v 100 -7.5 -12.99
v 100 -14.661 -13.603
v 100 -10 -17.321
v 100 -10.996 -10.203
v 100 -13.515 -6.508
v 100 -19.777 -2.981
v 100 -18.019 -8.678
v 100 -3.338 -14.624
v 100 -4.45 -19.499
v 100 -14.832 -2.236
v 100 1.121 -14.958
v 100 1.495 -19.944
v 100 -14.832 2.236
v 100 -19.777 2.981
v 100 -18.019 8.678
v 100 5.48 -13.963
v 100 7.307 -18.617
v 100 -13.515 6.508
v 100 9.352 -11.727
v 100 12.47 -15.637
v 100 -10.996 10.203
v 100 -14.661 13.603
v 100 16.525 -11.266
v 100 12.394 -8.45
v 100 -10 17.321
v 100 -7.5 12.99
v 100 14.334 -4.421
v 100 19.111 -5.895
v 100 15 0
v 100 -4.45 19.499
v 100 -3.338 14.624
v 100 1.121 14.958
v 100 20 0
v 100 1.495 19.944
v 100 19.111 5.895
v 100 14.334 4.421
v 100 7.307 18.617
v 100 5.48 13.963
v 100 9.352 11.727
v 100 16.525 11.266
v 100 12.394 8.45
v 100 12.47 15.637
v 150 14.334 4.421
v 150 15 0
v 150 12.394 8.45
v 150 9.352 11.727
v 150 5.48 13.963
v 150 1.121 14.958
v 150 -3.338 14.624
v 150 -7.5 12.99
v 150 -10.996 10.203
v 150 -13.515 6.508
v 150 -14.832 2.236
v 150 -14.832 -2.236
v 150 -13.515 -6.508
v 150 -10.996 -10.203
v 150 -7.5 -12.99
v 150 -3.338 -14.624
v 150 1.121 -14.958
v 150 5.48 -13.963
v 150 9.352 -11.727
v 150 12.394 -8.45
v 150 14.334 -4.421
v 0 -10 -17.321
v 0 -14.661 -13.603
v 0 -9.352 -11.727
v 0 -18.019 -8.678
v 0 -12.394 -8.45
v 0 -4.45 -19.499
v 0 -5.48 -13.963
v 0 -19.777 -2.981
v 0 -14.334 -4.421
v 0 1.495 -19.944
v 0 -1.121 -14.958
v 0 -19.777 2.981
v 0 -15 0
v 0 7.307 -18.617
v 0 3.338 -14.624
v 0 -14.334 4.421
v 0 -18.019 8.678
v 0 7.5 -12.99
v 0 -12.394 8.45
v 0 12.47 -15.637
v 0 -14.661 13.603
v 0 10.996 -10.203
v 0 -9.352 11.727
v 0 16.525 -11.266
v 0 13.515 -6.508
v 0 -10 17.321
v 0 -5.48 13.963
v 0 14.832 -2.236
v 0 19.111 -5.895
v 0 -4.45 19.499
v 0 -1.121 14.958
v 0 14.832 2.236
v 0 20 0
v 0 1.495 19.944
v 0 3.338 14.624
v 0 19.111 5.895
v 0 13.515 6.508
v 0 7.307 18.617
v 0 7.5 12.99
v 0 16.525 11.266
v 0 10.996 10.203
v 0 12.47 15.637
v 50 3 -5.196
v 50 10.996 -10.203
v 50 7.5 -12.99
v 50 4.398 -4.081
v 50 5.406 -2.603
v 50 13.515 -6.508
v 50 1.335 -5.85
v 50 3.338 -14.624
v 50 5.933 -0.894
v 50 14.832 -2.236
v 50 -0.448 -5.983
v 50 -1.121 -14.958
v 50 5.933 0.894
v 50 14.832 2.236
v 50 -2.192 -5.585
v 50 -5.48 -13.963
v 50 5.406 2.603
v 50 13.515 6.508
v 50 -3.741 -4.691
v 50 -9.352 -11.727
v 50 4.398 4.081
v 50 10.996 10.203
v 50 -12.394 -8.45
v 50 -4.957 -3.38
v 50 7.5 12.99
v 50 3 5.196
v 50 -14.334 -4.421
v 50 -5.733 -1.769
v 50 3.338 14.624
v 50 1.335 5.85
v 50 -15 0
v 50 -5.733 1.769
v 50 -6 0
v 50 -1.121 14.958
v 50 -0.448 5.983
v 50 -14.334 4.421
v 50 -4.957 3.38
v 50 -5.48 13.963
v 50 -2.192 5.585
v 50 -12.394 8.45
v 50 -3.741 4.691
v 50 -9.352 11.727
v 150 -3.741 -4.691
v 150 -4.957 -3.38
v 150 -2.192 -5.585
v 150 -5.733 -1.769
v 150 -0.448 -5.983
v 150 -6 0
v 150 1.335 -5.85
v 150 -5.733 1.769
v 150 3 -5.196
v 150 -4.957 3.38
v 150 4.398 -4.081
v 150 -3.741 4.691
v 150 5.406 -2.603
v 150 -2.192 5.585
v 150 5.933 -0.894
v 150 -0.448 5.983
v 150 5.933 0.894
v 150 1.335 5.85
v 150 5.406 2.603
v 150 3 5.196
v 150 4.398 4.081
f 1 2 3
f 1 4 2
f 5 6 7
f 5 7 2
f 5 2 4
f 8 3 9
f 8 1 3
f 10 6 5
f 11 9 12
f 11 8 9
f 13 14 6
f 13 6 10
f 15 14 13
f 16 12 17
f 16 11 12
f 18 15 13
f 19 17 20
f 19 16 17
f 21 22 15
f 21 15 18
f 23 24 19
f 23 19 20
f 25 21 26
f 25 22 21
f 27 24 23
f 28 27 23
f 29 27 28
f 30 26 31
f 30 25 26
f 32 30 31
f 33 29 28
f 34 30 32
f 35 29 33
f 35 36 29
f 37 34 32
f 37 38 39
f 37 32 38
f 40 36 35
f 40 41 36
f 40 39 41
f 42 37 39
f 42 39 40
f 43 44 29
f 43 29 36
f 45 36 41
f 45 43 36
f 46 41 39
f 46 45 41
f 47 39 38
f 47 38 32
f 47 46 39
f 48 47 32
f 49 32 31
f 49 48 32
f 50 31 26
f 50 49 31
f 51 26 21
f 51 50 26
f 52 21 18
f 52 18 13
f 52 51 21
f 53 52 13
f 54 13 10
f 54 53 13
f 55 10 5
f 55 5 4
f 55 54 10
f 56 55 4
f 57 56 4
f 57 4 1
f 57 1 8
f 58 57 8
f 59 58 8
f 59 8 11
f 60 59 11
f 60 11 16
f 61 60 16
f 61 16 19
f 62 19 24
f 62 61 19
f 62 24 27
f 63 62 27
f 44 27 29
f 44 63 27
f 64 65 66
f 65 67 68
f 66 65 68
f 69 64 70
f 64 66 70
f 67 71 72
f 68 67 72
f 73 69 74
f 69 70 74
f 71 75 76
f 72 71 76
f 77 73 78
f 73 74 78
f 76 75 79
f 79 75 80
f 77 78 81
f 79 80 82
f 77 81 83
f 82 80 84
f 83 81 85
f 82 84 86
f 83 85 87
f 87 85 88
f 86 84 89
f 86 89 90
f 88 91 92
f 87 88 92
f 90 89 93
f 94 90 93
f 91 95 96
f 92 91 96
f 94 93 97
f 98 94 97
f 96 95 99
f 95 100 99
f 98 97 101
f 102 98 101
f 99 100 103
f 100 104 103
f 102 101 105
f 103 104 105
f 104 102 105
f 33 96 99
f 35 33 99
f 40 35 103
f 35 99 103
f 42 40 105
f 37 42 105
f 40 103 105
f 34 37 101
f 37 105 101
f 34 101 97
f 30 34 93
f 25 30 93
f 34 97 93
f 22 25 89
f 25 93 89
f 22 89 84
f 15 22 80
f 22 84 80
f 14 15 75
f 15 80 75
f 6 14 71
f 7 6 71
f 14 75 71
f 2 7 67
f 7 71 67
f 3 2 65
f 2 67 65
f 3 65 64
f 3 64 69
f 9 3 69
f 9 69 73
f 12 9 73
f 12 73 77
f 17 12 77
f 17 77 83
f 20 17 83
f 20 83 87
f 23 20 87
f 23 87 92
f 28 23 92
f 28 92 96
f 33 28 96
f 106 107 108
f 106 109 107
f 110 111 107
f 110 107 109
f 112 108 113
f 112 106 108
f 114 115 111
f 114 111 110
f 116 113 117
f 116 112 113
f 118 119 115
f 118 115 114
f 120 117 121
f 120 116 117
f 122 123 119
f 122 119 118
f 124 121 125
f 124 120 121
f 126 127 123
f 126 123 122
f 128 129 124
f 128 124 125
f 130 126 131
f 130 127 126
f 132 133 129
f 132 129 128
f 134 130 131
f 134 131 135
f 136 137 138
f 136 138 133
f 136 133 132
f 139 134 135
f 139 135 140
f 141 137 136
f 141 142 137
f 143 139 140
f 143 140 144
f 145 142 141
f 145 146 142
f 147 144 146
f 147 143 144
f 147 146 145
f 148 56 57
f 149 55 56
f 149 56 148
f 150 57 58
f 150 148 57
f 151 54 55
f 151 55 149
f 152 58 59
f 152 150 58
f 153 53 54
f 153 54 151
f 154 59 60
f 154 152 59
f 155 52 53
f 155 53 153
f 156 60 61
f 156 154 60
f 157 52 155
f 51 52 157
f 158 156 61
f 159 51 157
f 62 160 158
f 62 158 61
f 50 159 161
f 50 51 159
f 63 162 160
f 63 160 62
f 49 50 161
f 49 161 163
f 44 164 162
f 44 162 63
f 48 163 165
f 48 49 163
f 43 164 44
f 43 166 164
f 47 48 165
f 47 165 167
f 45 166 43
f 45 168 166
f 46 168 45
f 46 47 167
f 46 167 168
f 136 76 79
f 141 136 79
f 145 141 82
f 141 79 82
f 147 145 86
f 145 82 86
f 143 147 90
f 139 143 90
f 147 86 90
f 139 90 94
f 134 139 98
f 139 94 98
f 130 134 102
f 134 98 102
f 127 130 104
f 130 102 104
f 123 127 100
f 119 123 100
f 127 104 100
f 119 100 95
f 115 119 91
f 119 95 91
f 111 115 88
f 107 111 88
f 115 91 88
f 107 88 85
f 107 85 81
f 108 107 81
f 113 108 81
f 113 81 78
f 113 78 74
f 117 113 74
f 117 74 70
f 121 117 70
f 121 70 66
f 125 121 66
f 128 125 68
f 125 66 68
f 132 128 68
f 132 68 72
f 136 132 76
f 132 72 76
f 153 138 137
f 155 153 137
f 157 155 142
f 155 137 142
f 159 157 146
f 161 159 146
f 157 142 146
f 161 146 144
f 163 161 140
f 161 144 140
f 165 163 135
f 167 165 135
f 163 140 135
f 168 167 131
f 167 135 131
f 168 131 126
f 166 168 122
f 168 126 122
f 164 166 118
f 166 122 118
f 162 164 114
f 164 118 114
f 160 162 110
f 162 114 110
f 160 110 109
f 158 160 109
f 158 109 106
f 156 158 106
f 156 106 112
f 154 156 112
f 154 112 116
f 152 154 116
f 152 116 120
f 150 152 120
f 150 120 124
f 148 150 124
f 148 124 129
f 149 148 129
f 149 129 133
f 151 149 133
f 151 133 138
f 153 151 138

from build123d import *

# Parameters (mm, degrees)
F0_R     = 20
F1_DEPTH = 150
F2_R     = 15
F2_R_2   = 6
F3_DEPTH = 50
F4_DEPTH = 150
F5_R     = 20
F5_R_2   = 15
F6_DEPTH = 50


with BuildPart() as f1:
    # F0 (on Right) → F1 (new body)
    with BuildSketch(Plane.YZ):
        Circle(F0_R)
    extrude(amount=F1_DEPTH)

    # F2 (on face) → F3 (cut)
    with BuildSketch(Plane(origin=(0, 0, 0), x_dir=(0, -1, 0), z_dir=(-1, 0, 0))):
        Circle(F2_R)
        Circle(F2_R_2, mode=Mode.SUBTRACT)
    extrude(amount=-F3_DEPTH, mode=Mode.SUBTRACT)

    # F4 (cut): a face of the model
    f4_faces = [f1.faces().sort_by_distance(p)[0] for p in [
        (0, 0, 0),
    ]]
    extrude(f4_faces, amount=-F4_DEPTH, mode=Mode.SUBTRACT)

    # F5 (on face) → F6 (cut)
    with BuildSketch(Plane.YZ.offset(150)):
        Circle(F5_R)
        Circle(F5_R_2, mode=Mode.SUBTRACT)
    extrude(amount=-F6_DEPTH, mode=Mode.SUBTRACT)


solid = f1.part
